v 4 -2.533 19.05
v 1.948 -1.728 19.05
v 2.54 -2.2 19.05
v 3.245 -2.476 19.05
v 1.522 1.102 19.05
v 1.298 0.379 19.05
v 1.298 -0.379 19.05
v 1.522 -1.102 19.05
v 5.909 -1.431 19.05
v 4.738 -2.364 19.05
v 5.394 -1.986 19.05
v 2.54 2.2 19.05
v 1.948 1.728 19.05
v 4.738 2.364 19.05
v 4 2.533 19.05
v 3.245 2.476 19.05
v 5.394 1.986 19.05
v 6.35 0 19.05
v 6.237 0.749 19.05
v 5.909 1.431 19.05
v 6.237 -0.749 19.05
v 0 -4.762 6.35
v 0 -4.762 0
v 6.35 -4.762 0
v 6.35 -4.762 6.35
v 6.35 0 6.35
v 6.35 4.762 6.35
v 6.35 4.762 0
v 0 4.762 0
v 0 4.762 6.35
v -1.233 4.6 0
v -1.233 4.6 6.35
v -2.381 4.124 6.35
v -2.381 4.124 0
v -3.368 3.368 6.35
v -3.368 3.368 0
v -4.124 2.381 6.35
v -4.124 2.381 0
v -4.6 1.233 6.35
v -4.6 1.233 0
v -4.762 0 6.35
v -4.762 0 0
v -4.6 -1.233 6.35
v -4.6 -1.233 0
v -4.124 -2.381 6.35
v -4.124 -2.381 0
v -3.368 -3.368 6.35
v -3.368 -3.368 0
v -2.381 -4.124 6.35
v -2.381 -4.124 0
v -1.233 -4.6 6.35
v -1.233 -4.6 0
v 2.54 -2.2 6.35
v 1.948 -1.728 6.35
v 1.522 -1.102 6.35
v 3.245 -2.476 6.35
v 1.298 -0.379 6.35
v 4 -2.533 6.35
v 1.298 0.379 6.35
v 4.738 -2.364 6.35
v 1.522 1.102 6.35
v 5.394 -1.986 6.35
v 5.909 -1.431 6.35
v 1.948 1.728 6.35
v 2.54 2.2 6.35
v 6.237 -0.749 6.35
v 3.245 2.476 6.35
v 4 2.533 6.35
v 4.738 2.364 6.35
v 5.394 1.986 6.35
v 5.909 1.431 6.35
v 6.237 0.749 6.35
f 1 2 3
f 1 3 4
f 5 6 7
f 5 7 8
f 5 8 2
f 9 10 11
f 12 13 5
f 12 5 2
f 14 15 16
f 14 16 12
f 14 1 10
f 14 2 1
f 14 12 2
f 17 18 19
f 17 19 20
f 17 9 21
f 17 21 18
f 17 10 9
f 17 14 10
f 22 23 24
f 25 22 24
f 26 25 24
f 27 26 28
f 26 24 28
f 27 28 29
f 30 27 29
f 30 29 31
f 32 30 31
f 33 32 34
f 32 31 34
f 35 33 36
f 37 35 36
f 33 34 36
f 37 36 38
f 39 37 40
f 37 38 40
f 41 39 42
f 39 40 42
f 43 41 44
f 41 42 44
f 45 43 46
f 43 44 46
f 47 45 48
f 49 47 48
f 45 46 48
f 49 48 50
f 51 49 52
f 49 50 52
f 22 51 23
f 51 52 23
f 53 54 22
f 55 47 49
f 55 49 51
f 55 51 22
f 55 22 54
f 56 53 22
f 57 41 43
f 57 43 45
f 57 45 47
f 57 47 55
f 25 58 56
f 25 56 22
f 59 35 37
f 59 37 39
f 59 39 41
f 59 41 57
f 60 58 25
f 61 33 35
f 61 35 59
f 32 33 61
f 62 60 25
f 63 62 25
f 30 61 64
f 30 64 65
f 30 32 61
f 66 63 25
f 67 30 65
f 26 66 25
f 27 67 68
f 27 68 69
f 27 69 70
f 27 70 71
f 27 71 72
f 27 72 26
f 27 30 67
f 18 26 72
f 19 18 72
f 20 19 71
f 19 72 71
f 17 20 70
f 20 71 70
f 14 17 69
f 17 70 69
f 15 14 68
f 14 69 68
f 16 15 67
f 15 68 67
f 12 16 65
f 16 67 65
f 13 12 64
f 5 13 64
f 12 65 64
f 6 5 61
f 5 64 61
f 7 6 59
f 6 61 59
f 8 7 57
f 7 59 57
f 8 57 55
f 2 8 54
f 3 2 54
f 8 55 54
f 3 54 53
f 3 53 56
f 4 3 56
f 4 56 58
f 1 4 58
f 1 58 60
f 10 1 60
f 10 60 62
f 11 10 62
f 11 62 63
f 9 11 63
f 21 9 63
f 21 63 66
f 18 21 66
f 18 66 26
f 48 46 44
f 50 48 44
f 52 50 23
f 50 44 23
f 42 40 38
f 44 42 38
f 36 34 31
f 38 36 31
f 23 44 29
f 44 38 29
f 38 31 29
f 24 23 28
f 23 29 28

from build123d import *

# Parameters (mm, degrees)
F2_DEPTH = 6.35
F1_R     = 2.54
F3_DEPTH = 19.05


with BuildPart() as f2:
    # F0 (on Top) → F2 (new body)
    with BuildSketch(Plane.XY):
        with BuildLine():
            Line((6.35, 4.7625), (0, 4.7625))
            ThreePointArc((0, 4.7625), (-4.7625, 0), (0, -4.7625))
            Line((0, -4.7625), (6.35, -4.7625))
            Line((6.35, -4.7625), (6.35, 4.7625))
        make_face()
    extrude(amount=F2_DEPTH)

    # F1 (on Top) → F3 (join)
    with BuildSketch(Plane.XY):
        with Locations((3.81, 0)):
            Circle(F1_R)
    extrude(amount=F3_DEPTH)


solid = f2.part
